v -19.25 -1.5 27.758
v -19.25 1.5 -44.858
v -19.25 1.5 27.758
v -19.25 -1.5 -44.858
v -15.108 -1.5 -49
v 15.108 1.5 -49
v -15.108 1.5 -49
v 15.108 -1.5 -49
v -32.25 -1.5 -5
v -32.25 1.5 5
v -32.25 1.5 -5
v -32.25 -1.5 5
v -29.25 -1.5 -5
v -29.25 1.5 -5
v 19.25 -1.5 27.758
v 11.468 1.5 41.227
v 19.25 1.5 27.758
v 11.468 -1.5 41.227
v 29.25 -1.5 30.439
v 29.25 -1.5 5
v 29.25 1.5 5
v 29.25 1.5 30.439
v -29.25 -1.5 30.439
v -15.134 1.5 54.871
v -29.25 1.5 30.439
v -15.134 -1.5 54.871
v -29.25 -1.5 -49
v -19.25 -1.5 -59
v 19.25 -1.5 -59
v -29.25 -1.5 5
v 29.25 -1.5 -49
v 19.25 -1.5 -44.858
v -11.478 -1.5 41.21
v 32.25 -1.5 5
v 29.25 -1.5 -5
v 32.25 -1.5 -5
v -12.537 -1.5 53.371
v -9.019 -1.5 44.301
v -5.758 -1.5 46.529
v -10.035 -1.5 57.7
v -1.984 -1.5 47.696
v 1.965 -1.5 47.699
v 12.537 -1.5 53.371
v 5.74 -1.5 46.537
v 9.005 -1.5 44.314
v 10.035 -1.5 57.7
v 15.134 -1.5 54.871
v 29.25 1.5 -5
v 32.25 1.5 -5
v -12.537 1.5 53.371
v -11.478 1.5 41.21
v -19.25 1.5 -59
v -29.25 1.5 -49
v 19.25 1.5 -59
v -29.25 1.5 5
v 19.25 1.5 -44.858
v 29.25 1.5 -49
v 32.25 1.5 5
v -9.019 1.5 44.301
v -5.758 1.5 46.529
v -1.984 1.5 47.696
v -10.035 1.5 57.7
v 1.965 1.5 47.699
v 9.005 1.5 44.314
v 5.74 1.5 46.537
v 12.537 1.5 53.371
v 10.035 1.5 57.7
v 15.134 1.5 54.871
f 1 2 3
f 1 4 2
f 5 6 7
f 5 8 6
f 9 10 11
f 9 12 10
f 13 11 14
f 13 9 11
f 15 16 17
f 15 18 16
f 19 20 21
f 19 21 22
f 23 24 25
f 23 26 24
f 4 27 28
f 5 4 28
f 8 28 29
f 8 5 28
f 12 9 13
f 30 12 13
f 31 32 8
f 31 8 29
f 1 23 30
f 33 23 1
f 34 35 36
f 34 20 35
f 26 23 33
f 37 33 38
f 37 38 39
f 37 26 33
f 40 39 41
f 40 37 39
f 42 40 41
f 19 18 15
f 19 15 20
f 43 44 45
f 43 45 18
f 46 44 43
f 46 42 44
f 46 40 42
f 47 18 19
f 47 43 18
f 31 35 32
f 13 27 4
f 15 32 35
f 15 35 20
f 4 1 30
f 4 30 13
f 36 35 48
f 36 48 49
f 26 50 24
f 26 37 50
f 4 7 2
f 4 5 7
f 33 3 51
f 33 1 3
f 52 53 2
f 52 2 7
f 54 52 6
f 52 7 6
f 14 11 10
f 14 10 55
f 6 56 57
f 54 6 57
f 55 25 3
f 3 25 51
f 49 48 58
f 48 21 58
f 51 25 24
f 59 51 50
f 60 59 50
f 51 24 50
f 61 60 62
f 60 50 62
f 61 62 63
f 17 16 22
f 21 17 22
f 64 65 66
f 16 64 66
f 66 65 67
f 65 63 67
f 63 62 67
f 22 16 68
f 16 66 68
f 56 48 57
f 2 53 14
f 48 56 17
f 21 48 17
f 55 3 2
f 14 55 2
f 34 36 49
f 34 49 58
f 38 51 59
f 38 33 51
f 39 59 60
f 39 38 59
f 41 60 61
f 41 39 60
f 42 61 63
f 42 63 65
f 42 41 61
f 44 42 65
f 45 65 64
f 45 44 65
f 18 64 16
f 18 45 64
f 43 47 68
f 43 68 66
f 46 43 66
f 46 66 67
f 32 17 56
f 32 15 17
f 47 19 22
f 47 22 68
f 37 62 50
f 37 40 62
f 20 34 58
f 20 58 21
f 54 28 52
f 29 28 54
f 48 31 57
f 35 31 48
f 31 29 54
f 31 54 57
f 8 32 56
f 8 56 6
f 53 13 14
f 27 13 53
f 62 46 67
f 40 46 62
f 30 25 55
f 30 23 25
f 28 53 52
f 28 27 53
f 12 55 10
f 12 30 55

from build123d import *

# Parameters (mm, degrees)
F1_DEPTH = 1.5


with BuildPart() as f1:
    # F0 (on Front) → F1 (new body, symmetric)
    with BuildSketch(Plane.XZ):
        Polygon((-19.25, -59), (19.25, -59), (29.25, -49), (29.25, -5), (32.25, -5), (32.25, 5), (29.25, 5), (29.25, 30.43933), (15.1342262987, 54.8714219789), (12.5366059283, 53.370632716), (10.0352904902, 57.7), (-10.0352904902, 57.7), (-12.5366059283, 53.370632716), (-15.1342262987, 54.8714219789), (-29.25, 30.43933), (-29.25, 5), (-32.25, 5), (-32.25, -5), (-29.25, -5), (-29.25, -49), align=None)
        with BuildLine():
            Line((19.25, 0), (19.25, -44.8578643763))
            Line((19.25, -44.8578643763), (15.1078643763, -49))
            Line((15.1078643763, -49), (-15.1078643763, -49))
            Line((-15.1078643763, -49), (-19.25, -44.8578643763))
            Line((-19.25, -44.8578643763), (-19.25, 0))
            Line((-19.25, 0), (-19.25, 27.7582098748))
            Line((-19.25, 27.7582098748), (-11.4781226068, 41.2100565349))
            ThreePointArc((-11.4781226068, 41.2100565349), (-0.0096357275, 47.8457480828), (11.4684858529, 41.2267361773))
            Line((11.4684858529, 41.2267361773), (19.25, 27.7582098748))
            Line((19.25, 27.7582098748), (19.25, 0))
        make_face(mode=Mode.SUBTRACT)
    extrude(amount=F1_DEPTH, both=True)


solid = f1.part
